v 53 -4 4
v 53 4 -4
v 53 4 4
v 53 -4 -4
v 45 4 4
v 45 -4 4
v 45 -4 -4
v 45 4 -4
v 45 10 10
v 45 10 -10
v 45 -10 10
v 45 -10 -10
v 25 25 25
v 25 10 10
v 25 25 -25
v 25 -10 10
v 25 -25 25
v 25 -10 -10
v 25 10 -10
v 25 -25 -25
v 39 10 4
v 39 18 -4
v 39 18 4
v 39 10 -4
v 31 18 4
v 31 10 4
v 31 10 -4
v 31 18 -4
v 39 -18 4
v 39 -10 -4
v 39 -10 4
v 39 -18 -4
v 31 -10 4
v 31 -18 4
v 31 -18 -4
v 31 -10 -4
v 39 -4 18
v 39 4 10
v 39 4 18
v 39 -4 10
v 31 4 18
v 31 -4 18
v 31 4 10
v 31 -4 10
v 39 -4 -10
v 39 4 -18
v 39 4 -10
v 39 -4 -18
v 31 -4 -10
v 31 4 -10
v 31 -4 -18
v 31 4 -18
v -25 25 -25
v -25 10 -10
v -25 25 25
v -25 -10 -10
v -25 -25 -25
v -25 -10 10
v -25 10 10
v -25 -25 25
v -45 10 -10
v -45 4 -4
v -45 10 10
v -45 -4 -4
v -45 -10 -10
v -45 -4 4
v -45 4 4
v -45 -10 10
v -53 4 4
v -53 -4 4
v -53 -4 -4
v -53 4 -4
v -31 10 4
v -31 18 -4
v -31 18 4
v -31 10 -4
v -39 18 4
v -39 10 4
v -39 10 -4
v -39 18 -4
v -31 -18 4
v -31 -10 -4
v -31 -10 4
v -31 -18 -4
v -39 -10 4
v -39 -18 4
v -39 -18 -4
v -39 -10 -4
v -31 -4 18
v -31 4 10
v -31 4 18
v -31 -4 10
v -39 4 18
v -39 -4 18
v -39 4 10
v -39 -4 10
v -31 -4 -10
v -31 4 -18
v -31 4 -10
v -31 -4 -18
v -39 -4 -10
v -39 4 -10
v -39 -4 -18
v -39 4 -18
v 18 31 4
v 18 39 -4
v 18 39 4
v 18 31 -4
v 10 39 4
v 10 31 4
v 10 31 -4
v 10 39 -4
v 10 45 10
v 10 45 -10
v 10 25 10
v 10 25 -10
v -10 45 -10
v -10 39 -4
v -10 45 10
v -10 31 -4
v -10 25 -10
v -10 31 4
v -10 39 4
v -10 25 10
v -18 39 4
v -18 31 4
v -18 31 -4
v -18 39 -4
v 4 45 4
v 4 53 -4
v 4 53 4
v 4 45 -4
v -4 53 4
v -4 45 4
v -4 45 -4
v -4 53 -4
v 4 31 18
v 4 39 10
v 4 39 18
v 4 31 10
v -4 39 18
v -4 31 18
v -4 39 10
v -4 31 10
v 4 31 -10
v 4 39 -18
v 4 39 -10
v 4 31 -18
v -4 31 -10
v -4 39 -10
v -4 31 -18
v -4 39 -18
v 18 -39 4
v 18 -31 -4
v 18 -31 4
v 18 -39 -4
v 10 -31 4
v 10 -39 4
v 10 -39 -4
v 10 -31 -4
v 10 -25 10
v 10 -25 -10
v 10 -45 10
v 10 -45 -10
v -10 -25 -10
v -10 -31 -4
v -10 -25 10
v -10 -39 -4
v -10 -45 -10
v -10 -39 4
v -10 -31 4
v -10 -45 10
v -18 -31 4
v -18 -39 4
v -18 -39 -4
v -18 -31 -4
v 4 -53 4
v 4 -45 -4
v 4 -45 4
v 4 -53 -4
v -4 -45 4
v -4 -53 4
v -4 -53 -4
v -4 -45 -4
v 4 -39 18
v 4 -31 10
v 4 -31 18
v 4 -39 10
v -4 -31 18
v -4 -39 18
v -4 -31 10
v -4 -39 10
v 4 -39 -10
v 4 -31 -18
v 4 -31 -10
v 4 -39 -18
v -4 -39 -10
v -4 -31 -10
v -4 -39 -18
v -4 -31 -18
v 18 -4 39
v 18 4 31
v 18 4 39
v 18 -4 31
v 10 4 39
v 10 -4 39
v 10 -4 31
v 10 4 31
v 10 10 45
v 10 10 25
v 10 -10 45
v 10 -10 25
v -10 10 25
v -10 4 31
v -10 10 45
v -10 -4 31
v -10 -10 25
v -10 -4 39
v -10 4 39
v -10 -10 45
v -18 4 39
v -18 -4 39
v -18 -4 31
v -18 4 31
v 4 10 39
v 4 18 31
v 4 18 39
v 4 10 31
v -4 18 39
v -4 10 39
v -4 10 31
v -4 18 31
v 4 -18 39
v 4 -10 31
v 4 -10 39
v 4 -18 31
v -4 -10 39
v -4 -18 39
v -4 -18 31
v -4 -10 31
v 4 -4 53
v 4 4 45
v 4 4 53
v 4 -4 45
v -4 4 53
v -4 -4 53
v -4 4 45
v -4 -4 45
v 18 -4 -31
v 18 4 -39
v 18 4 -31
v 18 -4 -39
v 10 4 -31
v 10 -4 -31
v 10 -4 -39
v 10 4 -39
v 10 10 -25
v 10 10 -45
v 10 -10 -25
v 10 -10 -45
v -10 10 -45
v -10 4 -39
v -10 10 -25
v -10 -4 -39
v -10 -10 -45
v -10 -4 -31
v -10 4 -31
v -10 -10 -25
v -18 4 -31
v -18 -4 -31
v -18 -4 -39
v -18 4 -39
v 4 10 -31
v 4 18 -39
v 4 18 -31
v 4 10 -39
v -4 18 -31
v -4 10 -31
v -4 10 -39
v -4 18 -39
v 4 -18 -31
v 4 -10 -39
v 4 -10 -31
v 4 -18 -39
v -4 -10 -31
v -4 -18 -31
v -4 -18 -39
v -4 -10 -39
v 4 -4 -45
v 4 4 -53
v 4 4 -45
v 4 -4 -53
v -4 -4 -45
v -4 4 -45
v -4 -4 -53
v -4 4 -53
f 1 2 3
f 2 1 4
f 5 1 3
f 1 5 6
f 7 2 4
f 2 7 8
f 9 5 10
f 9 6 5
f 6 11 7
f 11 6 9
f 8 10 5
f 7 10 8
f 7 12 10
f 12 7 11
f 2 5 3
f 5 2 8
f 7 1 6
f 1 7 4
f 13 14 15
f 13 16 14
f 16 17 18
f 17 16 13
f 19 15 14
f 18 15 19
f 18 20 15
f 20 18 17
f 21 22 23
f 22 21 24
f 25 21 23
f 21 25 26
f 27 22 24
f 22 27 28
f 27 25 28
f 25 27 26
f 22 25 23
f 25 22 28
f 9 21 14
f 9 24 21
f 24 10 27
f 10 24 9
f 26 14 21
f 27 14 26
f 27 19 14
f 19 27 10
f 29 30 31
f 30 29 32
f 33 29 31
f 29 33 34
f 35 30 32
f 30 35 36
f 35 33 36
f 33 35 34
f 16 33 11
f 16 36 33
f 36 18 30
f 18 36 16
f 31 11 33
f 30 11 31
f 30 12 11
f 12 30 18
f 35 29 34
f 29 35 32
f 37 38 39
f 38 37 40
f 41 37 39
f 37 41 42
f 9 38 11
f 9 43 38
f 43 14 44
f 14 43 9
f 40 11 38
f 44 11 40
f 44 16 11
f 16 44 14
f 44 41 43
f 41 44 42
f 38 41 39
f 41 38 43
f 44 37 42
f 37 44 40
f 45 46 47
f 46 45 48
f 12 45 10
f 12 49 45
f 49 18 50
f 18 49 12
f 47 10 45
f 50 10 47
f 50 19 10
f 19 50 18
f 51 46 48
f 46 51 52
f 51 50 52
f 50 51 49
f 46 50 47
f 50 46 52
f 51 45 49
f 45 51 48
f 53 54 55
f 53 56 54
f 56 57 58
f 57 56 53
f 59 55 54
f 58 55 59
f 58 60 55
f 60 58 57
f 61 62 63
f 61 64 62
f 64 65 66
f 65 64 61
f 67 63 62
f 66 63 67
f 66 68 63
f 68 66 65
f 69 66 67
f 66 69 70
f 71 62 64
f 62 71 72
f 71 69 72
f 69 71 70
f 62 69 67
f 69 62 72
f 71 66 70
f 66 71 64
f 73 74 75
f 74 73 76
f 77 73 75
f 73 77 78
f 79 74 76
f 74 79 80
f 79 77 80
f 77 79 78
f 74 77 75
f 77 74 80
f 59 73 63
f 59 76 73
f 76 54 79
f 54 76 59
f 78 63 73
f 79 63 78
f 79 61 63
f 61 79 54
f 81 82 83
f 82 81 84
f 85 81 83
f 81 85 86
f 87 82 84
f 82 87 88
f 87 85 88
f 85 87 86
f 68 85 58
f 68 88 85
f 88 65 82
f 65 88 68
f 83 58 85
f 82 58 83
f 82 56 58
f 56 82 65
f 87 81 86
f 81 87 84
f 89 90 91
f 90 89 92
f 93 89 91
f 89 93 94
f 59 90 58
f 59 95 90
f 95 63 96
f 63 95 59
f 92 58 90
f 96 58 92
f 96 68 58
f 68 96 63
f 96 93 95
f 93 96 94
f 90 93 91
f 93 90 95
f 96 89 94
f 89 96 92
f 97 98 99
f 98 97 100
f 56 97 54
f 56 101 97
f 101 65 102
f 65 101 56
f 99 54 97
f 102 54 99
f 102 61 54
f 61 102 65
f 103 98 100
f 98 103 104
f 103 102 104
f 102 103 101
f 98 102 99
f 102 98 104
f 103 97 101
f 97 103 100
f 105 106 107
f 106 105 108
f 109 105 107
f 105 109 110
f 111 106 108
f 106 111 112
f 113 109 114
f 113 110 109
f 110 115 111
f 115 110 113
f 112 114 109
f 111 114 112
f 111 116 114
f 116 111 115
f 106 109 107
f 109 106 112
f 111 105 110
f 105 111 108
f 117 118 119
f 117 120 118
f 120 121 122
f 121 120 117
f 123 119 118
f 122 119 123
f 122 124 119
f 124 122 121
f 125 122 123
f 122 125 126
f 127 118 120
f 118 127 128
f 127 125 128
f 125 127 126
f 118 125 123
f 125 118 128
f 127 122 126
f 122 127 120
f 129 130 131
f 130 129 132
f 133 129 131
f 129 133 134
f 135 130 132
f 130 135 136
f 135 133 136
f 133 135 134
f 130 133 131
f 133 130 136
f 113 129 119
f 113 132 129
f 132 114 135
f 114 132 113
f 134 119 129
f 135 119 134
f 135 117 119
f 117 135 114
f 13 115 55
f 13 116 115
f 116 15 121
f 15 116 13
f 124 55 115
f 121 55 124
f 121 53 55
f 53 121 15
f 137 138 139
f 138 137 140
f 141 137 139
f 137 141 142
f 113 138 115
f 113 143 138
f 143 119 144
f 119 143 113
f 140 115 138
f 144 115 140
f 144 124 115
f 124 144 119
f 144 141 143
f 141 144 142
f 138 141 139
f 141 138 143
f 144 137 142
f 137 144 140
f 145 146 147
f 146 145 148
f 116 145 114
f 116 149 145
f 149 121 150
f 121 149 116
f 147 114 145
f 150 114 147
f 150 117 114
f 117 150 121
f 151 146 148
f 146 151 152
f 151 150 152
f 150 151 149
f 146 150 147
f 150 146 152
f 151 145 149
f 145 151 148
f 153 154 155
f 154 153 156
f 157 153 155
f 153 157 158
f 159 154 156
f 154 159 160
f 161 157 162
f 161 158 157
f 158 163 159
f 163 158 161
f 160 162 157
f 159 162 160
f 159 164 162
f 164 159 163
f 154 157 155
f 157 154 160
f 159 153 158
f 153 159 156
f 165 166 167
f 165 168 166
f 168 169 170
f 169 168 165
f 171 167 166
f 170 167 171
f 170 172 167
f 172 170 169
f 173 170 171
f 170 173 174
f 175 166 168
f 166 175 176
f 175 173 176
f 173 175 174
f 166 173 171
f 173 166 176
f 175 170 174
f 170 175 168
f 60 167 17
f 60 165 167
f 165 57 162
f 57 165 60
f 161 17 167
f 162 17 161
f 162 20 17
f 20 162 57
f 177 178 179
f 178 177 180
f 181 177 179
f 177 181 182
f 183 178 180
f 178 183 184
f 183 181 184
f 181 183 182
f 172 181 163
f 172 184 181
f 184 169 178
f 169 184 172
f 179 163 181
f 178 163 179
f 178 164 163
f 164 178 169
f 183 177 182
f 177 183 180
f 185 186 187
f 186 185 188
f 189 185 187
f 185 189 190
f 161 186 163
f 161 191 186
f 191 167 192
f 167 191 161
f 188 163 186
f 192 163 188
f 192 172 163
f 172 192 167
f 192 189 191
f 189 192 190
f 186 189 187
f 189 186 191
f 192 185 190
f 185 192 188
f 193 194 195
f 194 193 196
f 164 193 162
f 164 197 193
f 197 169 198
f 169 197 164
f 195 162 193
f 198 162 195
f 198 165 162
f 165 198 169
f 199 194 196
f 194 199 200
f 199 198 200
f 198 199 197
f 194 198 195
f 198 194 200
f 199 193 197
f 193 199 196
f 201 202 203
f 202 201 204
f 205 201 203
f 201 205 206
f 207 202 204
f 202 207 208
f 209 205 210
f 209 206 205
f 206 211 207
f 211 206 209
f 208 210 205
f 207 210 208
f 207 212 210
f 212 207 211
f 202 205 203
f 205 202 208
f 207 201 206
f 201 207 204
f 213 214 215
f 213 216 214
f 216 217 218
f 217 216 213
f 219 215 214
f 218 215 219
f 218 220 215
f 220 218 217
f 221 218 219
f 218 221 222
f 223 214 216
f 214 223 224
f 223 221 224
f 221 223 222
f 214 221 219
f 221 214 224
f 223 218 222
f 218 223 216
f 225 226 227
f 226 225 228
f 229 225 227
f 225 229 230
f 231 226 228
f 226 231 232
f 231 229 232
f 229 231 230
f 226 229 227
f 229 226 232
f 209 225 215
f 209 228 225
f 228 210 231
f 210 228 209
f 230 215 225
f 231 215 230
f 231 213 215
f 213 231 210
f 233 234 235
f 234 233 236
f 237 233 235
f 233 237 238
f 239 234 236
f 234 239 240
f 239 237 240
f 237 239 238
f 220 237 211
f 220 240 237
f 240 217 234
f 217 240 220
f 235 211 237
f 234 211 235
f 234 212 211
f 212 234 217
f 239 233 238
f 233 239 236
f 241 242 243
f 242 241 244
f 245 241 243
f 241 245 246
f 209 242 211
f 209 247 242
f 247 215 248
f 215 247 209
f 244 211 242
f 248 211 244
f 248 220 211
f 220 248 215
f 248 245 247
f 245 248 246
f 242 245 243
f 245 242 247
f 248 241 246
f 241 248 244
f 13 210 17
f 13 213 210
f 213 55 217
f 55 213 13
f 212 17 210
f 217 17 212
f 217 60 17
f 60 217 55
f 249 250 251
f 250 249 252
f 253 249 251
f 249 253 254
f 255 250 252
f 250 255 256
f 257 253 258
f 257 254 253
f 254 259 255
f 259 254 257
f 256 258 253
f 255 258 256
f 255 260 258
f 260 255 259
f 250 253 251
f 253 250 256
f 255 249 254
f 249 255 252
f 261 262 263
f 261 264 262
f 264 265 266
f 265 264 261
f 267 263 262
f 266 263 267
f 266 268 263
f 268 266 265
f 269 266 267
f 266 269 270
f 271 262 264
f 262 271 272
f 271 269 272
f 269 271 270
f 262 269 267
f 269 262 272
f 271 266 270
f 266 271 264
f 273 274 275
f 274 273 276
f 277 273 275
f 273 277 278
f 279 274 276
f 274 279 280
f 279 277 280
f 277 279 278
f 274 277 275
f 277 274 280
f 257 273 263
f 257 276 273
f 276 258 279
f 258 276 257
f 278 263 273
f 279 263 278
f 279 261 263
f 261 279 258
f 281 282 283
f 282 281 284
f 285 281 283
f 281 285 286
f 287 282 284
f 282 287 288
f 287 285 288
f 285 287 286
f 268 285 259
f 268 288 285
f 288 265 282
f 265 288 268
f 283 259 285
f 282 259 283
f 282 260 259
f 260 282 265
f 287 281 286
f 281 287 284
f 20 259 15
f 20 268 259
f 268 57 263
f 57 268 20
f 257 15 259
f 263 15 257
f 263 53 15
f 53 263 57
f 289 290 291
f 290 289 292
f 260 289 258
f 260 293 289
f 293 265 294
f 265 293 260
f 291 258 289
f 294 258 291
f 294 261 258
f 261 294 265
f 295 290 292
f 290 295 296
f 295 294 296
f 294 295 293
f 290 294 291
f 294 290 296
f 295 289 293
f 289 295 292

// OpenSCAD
// Program by Ankur Gupta
// www.github.com/agupta231
// Jan 2017

/**
Permission is hereby granted, free of charge, to any person obtaining a copy
of this software and associated documentation files (the "Software"), to deal
in the Software without restriction, including without limitation the rights
to use, copy, modify, merge, publish, distribute, sublicense, and/or sell
copies of the Software, and to permit persons to whom the Software is
furnished to do so, subject to the following conditions:

The above copyright notice and this permission notice shall be included in all
copies or substantial portions of the Software.

THE SOFTWARE IS PROVIDED "AS IS", WITHOUT WARRANTY OF ANY KIND, EXPRESS OR
IMPLIED, INCLUDING BUT NOT LIMITED TO THE WARRANTIES OF MERCHANTABILITY,
FITNESS FOR A PARTICULAR PURPOSE AND NONINFRINGEMENT. IN NO EVENT SHALL THE
AUTHORS OR COPYRIGHT HOLDERS BE LIABLE FOR ANY CLAIM, DAMAGES OR OTHER
LIABILITY, WHETHER IN AN ACTION OF CONTRACT, TORT OR OTHERWISE, ARISING FROM,
OUT OF OR IN CONNECTION WITH THE SOFTWARE OR THE USE OR OTHER DEALINGS IN THE
SOFTWARE.
**/

init_size = 50;
iteration_multiplier = 0.4;
iterations = 2;

echo(version());

module aux_cubes(current_iter, starting_pos) {
    iter_size = init_size * pow(iteration_multiplier, current_iter);
    displacement = (init_size * (pow(iteration_multiplier, current_iter) + pow(iteration_multiplier, current_iter - 1))) / 2;
    
    for(i = [[displacement, 0, 0], [-displacement, 0, 0], [0, displacement, 0], [0, -displacement, 0], [0, 0, displacement], [0, 0, -displacement]]) {
        new_pos = i + starting_pos;
        
        translate(i + starting_pos) {
            cube(iter_size, center = true);
        }
        
        if(current_iter < iterations) {
            aux_cubes(current_iter + 1, new_pos);
        }
    }
}

union() {
    cube(init_size, center = true);
    
    aux_cubes(1, [0, 0, 0]);
}
